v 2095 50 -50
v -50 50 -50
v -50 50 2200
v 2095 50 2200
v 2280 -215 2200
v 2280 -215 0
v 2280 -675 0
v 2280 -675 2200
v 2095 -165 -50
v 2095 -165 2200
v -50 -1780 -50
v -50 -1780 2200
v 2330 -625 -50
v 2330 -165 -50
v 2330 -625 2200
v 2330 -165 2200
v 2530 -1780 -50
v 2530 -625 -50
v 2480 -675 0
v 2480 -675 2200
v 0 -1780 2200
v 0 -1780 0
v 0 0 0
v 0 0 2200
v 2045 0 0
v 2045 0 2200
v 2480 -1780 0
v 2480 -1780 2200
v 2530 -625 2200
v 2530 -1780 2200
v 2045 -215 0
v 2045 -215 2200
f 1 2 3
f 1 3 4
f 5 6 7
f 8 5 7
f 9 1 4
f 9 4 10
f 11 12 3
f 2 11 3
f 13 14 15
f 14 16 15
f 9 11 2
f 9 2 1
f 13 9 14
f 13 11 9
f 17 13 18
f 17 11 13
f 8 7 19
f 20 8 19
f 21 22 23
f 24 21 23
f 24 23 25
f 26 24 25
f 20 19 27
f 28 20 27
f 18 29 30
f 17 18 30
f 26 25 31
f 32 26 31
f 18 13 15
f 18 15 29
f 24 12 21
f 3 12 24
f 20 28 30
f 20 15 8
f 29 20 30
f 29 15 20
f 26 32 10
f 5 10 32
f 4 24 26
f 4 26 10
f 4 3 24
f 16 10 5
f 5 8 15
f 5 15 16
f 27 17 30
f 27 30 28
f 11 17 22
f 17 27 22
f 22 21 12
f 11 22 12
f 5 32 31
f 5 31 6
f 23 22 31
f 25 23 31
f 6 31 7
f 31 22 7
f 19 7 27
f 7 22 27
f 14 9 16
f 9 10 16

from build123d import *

# Parameters (mm, degrees)
F1_DEPTH = 2200
F3_DEPTH = 50


with BuildPart() as f1:
    # F0 (on Top) → F1 (new body)
    with BuildSketch(Plane.XY):
        Polygon((0, -1780), (0, 0), (2045, 0), (2045, -215), (2280, -215), (2280, -675), (2480, -675), (2480, -1780), (2530, -1780), (2530, -625), (2330, -625), (2330, -165), (2095, -165), (2095, 50), (-50, 50), (-50, -1780), align=None)
    extrude(amount=F1_DEPTH)

    # F2 (on face) → F3 (join)
    with BuildSketch(Plane(origin=(0, 0, 0), x_dir=(1, 0, 0), z_dir=(0, 0, -1))):
        Polygon((-50, 1780), (-50, -50), (2095, -50), (2095, 165), (2330, 165), (2330, 625), (2530, 625), (2530, 1780), align=None)
    extrude(amount=F3_DEPTH)


solid = f1.part
